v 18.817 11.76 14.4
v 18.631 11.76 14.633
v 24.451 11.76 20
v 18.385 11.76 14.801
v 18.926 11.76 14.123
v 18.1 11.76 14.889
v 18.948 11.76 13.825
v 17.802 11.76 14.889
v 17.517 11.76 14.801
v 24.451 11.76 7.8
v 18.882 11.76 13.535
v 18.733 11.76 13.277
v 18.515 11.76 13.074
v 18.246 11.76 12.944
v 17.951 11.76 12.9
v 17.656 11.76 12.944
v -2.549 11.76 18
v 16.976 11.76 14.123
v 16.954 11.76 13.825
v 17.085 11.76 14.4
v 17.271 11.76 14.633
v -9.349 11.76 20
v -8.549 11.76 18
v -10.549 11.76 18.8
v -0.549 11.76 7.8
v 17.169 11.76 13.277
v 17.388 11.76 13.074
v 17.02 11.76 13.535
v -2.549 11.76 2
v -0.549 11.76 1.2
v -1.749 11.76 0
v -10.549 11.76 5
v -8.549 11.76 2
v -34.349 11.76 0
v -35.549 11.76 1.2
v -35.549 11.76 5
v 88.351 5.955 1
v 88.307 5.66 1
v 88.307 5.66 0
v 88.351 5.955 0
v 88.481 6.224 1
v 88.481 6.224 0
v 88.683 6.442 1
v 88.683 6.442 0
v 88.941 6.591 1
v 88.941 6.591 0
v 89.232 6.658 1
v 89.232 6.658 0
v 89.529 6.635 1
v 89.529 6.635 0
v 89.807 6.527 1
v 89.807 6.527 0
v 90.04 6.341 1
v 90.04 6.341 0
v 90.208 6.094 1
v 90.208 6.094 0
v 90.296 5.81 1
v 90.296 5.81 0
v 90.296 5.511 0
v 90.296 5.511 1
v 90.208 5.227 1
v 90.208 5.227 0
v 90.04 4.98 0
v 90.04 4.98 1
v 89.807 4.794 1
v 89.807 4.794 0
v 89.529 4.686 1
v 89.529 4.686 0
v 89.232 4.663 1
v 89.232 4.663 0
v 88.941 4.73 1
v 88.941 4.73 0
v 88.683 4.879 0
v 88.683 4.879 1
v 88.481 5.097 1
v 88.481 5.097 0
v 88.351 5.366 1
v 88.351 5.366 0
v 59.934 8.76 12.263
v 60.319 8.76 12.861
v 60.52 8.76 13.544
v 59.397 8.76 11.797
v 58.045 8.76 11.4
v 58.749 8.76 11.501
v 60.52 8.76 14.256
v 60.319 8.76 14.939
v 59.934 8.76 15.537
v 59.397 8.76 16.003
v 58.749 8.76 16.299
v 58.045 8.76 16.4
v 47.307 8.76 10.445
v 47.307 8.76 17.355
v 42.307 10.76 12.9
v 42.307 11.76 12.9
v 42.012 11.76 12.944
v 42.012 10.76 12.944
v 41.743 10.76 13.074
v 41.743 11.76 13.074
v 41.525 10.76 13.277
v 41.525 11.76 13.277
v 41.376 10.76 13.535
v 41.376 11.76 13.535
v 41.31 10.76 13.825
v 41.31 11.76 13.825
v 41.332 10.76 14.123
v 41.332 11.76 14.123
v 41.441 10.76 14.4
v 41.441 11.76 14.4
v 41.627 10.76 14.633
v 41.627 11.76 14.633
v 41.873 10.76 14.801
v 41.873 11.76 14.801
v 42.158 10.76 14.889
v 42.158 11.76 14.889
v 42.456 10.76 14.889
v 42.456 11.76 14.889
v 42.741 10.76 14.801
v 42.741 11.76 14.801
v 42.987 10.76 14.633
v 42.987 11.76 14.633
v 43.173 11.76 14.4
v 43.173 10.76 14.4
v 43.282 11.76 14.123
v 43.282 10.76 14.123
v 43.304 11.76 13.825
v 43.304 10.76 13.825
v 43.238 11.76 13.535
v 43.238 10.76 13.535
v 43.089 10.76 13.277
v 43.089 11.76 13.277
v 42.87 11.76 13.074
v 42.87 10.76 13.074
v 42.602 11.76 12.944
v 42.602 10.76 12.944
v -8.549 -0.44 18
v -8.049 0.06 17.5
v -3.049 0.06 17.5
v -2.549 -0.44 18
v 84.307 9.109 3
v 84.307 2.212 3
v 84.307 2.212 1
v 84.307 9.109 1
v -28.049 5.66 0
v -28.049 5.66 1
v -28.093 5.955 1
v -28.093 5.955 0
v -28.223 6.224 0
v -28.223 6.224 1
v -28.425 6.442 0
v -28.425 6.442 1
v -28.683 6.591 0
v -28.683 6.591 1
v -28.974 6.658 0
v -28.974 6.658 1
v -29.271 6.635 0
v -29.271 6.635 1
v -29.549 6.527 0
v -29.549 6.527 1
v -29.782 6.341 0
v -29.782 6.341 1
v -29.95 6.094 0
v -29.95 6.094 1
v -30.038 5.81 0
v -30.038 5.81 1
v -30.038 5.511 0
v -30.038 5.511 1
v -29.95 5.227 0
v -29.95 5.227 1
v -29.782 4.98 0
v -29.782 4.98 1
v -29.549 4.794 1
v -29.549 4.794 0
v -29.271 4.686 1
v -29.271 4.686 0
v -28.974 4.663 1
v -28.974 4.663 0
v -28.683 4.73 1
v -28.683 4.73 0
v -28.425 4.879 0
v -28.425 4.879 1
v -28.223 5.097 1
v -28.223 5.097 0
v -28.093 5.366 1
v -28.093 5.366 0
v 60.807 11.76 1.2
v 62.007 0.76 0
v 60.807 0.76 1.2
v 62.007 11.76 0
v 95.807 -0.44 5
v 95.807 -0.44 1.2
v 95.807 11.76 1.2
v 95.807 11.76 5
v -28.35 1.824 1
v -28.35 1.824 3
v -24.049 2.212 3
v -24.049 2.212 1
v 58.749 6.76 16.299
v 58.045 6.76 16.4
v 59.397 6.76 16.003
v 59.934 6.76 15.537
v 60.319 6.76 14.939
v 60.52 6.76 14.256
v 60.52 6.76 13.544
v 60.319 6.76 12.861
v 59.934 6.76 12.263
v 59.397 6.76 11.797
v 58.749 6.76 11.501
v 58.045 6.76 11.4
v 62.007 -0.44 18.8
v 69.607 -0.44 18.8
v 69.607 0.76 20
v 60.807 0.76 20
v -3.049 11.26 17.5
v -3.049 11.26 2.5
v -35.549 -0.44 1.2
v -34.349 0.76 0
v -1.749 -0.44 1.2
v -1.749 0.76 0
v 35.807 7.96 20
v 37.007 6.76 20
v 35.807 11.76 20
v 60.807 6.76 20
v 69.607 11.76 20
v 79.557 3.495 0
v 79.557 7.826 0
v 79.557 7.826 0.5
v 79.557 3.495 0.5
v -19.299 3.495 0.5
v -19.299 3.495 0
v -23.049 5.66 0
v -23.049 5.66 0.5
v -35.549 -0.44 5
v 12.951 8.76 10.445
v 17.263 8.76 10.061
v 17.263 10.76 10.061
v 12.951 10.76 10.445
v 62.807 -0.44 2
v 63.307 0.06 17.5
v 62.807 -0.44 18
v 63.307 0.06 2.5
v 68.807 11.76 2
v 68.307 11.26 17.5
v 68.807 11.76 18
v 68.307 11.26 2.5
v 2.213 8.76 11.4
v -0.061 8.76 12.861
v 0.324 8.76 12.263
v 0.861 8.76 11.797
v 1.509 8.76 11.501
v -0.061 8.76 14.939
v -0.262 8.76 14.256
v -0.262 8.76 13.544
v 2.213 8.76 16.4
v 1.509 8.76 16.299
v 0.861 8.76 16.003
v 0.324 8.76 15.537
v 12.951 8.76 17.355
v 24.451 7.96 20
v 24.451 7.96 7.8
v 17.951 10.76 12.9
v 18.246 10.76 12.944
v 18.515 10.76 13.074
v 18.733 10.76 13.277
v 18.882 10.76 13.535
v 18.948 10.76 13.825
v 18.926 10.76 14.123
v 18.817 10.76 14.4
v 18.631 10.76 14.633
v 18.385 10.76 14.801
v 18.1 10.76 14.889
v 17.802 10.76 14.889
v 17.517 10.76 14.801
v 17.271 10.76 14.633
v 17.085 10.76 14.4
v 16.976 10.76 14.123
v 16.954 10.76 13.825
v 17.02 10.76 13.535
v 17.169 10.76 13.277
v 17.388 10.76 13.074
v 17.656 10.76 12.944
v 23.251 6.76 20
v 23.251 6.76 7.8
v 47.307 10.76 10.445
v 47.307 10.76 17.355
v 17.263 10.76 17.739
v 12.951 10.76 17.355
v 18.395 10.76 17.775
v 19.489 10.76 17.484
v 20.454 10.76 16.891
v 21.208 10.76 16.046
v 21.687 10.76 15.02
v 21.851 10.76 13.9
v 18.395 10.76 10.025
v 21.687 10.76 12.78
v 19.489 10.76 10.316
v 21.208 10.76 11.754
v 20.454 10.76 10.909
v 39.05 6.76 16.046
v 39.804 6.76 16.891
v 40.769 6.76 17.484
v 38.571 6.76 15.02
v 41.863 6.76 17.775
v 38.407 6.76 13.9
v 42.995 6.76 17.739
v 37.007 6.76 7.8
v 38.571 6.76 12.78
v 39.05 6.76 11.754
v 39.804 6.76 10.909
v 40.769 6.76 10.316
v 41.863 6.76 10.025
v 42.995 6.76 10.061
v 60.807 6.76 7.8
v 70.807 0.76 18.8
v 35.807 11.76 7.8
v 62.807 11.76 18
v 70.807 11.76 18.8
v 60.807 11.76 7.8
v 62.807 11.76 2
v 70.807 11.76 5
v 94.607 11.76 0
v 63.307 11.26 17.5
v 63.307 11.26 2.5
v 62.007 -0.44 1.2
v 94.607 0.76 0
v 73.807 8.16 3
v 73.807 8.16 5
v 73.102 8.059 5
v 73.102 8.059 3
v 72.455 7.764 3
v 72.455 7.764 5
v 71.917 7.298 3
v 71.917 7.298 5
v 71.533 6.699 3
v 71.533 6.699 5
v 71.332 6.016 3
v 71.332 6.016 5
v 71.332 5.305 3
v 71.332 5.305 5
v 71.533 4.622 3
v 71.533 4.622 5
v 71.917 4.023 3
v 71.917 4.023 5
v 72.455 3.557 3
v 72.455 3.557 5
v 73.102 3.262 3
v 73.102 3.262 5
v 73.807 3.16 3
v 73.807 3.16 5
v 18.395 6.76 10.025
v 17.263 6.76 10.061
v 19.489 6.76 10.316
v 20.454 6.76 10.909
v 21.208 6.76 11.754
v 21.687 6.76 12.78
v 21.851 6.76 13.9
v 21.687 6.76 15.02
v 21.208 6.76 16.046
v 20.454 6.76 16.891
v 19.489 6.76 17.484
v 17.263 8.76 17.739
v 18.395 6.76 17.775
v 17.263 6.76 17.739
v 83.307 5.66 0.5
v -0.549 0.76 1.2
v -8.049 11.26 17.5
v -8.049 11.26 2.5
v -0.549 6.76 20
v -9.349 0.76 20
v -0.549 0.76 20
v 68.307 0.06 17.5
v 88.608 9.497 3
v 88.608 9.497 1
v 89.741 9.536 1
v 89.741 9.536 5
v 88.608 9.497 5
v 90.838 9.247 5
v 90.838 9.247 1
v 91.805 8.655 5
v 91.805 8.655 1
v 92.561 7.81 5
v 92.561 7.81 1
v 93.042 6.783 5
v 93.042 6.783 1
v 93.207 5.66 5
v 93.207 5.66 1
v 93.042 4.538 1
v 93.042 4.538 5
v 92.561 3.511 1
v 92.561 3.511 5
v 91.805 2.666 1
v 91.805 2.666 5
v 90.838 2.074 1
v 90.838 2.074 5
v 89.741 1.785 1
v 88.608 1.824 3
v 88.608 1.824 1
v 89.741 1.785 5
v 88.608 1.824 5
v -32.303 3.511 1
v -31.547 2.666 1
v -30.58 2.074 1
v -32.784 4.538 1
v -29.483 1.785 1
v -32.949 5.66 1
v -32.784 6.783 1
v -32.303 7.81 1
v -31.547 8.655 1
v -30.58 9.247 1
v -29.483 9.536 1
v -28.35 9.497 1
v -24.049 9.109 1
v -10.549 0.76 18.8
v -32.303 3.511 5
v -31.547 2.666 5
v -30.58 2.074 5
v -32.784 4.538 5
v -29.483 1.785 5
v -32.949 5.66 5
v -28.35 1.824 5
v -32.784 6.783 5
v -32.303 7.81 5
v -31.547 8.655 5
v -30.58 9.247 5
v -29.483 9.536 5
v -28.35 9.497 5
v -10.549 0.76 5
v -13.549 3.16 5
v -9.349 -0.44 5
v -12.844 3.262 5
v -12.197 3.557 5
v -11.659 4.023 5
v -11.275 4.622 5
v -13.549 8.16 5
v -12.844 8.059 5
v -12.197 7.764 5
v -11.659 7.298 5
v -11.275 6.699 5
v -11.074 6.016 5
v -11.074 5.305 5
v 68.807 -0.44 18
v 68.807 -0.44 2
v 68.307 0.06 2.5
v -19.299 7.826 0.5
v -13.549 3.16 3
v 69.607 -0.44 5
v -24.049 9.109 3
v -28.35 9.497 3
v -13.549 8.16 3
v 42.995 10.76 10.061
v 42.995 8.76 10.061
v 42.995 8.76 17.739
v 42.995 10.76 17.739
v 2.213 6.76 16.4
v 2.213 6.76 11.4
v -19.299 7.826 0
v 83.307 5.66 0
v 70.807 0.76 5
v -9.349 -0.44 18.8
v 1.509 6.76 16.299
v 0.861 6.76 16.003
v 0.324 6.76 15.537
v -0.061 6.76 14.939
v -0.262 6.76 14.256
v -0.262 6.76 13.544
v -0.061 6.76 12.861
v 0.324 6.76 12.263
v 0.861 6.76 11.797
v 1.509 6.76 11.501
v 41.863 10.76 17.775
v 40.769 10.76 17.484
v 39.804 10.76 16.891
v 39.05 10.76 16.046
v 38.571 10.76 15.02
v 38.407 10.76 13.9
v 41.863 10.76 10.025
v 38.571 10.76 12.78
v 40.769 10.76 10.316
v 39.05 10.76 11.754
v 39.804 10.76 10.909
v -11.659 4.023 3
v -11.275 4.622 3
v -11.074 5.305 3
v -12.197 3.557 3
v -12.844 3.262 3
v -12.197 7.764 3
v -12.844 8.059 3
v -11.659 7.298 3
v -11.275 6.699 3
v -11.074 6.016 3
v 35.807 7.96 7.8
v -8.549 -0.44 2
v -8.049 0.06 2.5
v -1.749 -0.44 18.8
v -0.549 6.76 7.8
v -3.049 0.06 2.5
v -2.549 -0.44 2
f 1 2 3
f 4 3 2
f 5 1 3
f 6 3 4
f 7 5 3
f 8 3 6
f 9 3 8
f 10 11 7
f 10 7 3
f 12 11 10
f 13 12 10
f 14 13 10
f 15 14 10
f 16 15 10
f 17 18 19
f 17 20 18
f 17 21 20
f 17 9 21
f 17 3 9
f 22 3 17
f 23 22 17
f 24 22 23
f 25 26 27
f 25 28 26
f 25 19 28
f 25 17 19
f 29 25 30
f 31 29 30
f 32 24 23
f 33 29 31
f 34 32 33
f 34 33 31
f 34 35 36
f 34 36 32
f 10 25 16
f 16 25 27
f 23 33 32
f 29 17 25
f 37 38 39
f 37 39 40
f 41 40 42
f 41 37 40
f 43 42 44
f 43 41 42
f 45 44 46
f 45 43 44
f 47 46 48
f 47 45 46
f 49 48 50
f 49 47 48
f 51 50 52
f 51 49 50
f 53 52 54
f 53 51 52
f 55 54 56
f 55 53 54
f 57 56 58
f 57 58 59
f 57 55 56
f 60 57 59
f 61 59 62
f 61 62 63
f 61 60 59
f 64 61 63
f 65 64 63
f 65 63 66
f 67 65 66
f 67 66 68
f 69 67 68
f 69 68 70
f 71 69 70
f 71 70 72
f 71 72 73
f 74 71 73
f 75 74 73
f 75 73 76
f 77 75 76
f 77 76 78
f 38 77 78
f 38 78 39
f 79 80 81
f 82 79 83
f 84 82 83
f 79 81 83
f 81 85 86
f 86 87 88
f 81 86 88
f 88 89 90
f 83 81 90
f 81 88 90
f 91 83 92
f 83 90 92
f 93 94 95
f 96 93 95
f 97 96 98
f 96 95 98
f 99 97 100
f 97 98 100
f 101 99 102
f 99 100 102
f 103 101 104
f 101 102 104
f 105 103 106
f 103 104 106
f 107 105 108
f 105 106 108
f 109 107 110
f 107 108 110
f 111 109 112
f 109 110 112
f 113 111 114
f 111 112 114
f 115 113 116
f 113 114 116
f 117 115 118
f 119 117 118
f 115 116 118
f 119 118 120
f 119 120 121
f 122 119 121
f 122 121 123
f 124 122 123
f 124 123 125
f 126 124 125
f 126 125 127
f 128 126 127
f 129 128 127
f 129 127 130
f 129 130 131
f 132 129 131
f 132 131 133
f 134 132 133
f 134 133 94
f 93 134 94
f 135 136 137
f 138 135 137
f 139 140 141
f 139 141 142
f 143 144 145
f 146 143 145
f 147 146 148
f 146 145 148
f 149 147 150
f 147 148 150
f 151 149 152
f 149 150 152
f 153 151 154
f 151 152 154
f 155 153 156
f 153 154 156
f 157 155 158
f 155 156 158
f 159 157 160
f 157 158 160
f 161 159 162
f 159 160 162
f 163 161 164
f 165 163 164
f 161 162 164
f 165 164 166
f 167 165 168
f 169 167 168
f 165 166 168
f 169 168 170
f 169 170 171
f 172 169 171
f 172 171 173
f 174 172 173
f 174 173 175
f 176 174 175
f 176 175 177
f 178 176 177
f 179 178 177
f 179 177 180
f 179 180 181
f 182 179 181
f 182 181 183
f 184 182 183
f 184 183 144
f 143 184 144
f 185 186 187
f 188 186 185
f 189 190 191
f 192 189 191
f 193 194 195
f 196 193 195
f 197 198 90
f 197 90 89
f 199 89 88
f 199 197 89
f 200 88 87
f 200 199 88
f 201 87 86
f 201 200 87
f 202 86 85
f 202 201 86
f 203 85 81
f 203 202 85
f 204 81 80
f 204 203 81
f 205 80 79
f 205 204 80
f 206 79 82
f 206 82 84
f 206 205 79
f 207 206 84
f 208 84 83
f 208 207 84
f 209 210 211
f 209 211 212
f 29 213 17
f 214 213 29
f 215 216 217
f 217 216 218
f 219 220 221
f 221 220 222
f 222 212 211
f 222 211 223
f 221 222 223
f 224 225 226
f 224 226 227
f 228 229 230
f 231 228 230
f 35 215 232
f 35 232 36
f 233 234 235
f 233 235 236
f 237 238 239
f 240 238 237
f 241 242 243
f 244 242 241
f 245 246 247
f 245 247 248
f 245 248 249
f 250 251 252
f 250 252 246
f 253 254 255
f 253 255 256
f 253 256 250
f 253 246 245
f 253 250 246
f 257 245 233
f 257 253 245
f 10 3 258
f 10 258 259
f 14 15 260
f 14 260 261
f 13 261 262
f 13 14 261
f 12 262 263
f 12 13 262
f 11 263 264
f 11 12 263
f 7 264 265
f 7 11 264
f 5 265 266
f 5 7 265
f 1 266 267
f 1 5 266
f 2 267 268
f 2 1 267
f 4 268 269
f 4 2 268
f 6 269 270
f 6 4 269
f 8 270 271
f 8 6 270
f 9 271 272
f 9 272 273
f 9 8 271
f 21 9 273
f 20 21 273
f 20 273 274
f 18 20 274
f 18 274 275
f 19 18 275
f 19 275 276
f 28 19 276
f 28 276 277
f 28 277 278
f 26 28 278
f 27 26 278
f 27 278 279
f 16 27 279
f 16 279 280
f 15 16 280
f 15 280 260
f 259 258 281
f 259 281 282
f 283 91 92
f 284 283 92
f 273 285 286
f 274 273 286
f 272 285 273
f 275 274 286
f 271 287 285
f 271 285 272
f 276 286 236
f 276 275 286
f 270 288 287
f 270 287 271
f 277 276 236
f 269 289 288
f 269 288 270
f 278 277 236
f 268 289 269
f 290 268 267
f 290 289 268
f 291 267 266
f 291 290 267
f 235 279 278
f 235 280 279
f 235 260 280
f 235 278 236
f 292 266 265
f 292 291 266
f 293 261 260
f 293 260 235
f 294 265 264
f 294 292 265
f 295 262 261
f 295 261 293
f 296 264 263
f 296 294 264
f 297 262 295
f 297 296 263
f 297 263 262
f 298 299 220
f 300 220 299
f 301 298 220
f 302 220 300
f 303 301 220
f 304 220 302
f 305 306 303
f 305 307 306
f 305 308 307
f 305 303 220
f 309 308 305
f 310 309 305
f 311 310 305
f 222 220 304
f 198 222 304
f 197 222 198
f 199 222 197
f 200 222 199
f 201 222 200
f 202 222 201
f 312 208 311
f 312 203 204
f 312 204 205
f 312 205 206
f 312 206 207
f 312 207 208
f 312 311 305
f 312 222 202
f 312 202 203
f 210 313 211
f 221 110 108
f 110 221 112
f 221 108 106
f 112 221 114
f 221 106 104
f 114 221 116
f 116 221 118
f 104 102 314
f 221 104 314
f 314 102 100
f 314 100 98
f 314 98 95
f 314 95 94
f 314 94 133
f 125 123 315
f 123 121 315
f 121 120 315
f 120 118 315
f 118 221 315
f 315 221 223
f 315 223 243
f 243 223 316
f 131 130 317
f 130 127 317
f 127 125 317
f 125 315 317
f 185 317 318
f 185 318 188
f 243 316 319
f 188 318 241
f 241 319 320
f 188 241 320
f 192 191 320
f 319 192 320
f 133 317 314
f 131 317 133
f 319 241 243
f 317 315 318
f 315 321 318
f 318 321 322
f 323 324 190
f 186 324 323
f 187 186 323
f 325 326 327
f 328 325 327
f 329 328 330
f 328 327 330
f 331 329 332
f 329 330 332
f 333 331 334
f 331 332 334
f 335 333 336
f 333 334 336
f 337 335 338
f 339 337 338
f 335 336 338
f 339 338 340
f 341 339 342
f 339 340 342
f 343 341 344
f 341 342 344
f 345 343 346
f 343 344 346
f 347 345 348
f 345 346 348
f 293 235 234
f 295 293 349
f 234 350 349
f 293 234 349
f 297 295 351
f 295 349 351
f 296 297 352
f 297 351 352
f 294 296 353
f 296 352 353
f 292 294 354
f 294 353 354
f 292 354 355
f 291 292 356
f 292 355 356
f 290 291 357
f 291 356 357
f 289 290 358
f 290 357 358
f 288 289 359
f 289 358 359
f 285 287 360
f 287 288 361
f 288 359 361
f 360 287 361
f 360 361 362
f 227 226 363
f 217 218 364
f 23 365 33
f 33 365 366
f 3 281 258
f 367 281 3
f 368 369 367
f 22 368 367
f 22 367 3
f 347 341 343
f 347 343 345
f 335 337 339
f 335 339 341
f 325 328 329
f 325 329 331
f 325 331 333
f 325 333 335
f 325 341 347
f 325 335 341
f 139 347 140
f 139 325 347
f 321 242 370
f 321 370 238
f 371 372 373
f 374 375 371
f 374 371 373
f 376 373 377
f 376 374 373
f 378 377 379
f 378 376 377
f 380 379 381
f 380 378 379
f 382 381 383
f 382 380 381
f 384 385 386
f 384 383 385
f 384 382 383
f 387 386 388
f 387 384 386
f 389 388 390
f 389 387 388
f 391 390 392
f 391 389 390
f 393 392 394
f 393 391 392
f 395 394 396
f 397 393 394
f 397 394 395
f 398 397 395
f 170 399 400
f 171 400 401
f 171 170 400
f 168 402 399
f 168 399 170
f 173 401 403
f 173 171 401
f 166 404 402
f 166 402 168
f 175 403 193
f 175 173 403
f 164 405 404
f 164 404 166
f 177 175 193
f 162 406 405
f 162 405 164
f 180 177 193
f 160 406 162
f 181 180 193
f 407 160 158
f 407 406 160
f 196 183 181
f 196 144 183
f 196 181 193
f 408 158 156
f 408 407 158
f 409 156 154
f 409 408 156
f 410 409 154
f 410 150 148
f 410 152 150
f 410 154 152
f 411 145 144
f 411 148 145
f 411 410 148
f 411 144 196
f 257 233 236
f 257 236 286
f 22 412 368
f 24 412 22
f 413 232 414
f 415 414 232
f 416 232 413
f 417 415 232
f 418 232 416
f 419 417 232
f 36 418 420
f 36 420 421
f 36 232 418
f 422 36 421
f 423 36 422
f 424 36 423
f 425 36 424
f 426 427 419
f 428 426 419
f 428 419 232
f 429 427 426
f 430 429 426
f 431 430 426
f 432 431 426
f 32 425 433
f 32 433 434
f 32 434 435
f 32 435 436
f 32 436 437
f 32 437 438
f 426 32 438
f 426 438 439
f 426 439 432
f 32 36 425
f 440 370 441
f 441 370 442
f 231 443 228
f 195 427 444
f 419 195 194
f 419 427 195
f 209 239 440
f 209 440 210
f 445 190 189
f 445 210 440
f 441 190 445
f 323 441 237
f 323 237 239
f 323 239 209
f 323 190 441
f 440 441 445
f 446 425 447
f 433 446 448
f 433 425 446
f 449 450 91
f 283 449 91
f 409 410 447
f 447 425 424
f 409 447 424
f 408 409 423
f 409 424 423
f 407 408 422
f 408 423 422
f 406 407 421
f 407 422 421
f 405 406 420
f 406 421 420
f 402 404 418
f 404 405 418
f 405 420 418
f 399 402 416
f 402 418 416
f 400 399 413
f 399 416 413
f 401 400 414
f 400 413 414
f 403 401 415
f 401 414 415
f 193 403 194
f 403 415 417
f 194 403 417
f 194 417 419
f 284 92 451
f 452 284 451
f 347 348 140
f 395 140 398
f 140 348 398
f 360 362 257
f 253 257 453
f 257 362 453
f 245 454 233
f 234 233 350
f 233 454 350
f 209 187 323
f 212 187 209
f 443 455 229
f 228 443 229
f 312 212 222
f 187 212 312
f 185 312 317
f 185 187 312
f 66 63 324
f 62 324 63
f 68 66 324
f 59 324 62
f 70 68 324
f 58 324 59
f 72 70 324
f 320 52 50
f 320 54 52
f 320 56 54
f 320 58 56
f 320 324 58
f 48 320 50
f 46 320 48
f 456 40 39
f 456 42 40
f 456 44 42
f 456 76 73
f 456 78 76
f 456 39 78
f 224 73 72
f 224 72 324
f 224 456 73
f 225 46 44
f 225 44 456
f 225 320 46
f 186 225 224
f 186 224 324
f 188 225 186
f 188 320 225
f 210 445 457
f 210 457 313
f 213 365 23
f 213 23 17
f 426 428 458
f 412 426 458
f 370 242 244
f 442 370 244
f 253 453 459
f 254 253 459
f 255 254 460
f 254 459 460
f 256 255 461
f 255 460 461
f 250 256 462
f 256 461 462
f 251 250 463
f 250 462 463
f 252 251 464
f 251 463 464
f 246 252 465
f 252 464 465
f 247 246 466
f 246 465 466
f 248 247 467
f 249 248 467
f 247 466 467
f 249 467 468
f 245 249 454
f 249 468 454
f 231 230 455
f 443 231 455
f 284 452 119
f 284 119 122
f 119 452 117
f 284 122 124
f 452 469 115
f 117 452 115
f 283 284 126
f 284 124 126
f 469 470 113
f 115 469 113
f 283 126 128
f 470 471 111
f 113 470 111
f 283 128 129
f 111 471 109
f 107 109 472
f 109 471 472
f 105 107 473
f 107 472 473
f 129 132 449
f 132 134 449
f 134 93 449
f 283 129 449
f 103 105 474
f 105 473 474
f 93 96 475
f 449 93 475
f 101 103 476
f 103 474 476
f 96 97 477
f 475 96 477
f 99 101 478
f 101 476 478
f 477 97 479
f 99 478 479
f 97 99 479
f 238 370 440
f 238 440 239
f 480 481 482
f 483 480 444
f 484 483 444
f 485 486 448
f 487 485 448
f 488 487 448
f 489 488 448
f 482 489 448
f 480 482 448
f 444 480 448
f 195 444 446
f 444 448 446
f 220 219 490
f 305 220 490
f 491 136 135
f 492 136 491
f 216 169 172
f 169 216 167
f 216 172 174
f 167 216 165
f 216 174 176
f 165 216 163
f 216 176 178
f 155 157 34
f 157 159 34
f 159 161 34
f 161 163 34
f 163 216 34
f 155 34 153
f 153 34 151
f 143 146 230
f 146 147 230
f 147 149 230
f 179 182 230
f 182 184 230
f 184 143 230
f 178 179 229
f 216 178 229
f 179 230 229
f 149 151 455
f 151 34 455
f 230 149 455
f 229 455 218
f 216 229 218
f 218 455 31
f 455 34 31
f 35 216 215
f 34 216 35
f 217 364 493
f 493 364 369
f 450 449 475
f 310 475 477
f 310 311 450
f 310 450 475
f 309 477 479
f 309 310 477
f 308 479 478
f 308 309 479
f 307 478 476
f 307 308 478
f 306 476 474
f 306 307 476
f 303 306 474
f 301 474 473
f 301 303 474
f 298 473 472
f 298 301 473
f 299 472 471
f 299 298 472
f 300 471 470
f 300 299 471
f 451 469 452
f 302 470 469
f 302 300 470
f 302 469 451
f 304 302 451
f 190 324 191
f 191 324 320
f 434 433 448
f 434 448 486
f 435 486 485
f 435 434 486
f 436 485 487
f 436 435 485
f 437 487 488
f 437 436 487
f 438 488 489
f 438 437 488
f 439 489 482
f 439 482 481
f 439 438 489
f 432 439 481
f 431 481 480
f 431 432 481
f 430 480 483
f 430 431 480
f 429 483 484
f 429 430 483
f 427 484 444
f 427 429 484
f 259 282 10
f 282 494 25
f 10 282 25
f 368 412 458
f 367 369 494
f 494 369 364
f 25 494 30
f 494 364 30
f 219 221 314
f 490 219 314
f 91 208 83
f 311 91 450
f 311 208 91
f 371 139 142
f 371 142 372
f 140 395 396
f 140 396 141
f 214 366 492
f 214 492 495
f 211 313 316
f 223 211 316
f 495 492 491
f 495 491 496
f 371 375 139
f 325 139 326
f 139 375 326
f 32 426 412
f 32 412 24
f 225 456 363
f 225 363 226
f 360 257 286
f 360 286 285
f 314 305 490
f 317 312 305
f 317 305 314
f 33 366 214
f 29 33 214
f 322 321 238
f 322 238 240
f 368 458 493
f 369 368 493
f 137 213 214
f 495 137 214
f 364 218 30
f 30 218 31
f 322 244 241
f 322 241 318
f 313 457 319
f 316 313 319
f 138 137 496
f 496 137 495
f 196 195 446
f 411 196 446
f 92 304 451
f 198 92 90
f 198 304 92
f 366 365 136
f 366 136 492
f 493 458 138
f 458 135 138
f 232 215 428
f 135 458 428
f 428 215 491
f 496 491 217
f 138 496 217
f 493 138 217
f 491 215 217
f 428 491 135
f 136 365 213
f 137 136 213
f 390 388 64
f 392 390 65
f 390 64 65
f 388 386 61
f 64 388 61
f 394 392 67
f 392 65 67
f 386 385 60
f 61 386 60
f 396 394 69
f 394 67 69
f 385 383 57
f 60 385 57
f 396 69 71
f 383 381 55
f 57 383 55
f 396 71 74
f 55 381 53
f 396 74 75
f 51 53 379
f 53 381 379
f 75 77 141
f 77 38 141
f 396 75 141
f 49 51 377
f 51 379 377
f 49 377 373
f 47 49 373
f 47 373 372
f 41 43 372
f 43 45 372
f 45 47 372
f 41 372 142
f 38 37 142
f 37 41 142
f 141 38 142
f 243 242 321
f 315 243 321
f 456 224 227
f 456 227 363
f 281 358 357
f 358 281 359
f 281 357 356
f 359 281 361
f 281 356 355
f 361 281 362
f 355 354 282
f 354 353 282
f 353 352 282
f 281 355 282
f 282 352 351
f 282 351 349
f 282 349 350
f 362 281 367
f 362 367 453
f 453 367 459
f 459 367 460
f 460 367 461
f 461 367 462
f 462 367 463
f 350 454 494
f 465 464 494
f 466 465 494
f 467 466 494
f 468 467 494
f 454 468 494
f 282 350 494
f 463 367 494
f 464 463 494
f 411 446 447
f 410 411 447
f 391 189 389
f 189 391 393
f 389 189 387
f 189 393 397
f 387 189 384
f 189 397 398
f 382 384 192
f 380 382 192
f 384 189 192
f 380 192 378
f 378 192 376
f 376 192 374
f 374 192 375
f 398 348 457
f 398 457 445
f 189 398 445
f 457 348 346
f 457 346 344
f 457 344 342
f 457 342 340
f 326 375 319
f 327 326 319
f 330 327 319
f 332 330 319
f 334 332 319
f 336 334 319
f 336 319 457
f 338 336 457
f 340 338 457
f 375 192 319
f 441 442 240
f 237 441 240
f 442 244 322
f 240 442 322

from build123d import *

# Parameters (mm, degrees)
SKETCH1_W               = 35
SKETCH1_H               = 12.2
BOSS_EXTRUDE1_DEPTH     = 5
SKETCH2_R               = 1
CUT_EXTRUDE1_DEPTH      = 38.775970389
SKETCH3_W               = 10
SKETCH3_H               = 12.2
BOSS_EXTRUDE2_DEPTH     = 15
SKETCH4_W               = 12.2
SKETCH4_H               = 5
BOSS_EXTRUDE3_DEPTH     = 25
CUT_EXTRUDE2_DEPTH      = 42.419255471
CUT_EXTRUDE2_DEPTH_BACK = 42.419255471
SKETCH5_R               = 1
CUT_EXTRUDE3_DEPTH      = 0.5
CHAMFER1_SIZE           = 1.2
SKETCH8_R               = 3.9
CUT_EXTRUDE4_DEPTH      = 4
CUT_EXTRUDE5_DEPTH      = 2
CUT_EXTRUDE6_DEPTH      = 4
SKETCH20_R              = 3.9
CUT_EXTRUDE11_DEPTH     = 4
CUT_EXTRUDE12_DEPTH     = 2
CUT_EXTRUDE13_DEPTH     = 4
SKETCH23_W              = 5
SKETCH23_H              = 15
CUT_EXTRUDE14_DEPTH     = 43.574108608
CHAMFER2_SIZE           = 0.5


with BuildPart() as part:
    # Sketch1 → Boss-Extrude1 (new body)
    with BuildSketch(Plane.XY):
        with Locations((-18.048765432, 5.660493827)):
            Rectangle(SKETCH1_W, SKETCH1_H)
    extrude(amount=BOSS_EXTRUDE1_DEPTH)

    # Sketch2 → Cut-Extrude1 (cut, through all)
    with BuildSketch(Plane.XY.offset(5)):
        with Locations((-29.048765432, 5.660493827)):
            Circle(SKETCH2_R)
    extrude(amount=-CUT_EXTRUDE1_DEPTH, mode=Mode.SUBTRACT)

    # Sketch3 → Boss-Extrude2 (add)
    with BuildSketch(Plane.XY.offset(5)):
        with Locations((-5.548765432, 5.660493827)):
            Rectangle(SKETCH3_W, SKETCH3_H)
    extrude(amount=BOSS_EXTRUDE2_DEPTH)

    # Sketch4 → Boss-Extrude3 (add)
    with BuildSketch(Plane(origin=(-0.548765432, 0, 0), x_dir=(0, 0, -1), z_dir=(1, 0, 0))):
        with Locations((-13.9, 9.260493827)):
            Rectangle(SKETCH4_W, SKETCH4_H)
    extrude(amount=BOSS_EXTRUDE3_DEPTH)

    # Sketch5 → Cut-Extrude2 (cut, two sides: drawn at the far end of the back side and taken through both)
    with BuildSketch(Plane.XZ.offset(-6.760493827).offset(-CUT_EXTRUDE2_DEPTH_BACK)):
        with Locations(Location((17.951234568, 13.9, 0), (0, 0, 270))):
            Circle(SKETCH5_R)
    extrude(amount=CUT_EXTRUDE2_DEPTH + CUT_EXTRUDE2_DEPTH_BACK, mode=Mode.SUBTRACT)

    # Sketch7 → Cut-Extrude3 (cut)
    with BuildSketch(Plane(origin=(0, 0, 0), x_dir=(-1, 0, 0), z_dir=(0, 0, -1))):
        Polygon((23.048765432, 5.660493827), (19.298765432, 7.825557337), (19.298765432, 3.495430318), align=None)
    extrude(amount=-CUT_EXTRUDE3_DEPTH, mode=Mode.SUBTRACT)

    # Chamfer1
    chamfer1_edges = [part.edges().sort_by_distance(p)[0] for p in [
        (-10.548765432, -0.439506173, 12.5),
        (-10.548765432, 5.660493827, 20),
        (-5.548765432, -0.439506173, 20),
        (24.451234568, 6.760493827, 13.9),
        (-0.548765432, 5.660493827, 0),
        (-18.048765432, -0.439506173, 0),
        (-35.548765432, 5.660493827, 0),
        (-0.548765432, -0.439506173, 10),
    ]]
    chamfer(chamfer1_edges, length=CHAMFER1_SIZE)

    # Sketch8 → Cut-Extrude4 (cut)
    with BuildSketch(Plane.XY.offset(5)):
        with Locations((-29.048765432, 5.660493827)):
            Circle(SKETCH8_R)
    extrude(amount=-CUT_EXTRUDE4_DEPTH, mode=Mode.SUBTRACT)

    # Sketch10 → Cut-Extrude5 (cut)
    with BuildSketch(Plane.XY.offset(5)):
        with BuildLine():
            Line((-29.048765432, 9.560493827), (-13.548765432, 8.160493827))
            ThreePointArc((-13.548765432, 8.160493827), (-11.048765432, 5.660493827), (-13.548765432, 3.160493827))
            Line((-13.548765432, 3.160493827), (-29.048765432, 1.760493827))
            Line((-29.048765432, 1.760493827), (-29.048765432, 9.560493827))
        make_face()
    extrude(amount=-CUT_EXTRUDE5_DEPTH, mode=Mode.SUBTRACT)

    # Sketch12 → Cut-Extrude6 (cut)
    with BuildSketch(Plane.XY.offset(5)):
        Polygon((-24.048765432, 5.660493827), (-24.048765432, 9.108880924), (-29.048765432, 9.560493827), (-29.048765432, 1.760493827), (-24.048765432, 2.21210673), align=None)
    extrude(amount=-CUT_EXTRUDE6_DEPTH, mode=Mode.SUBTRACT)

    # Sketch20 → Cut-Extrude11 (cut)
    with BuildSketch(Plane.XZ.offset(-6.760493827)):
        with Locations(Location((17.951234568, 13.9, 0), (0, 0, 270))):
            Circle(SKETCH20_R)
    extrude(amount=-CUT_EXTRUDE11_DEPTH, mode=Mode.SUBTRACT)

    # Sketch21 → Cut-Extrude12 (cut)
    with BuildSketch(Plane.XZ.offset(-6.760493827)):
        with BuildLine():
            Line((17.951234568, 17.8), (2.21295028, 16.4))
            ThreePointArc((2.21295028, 16.4), (-0.28704972, 13.9), (2.21295028, 11.4))
            Line((2.21295028, 11.4), (17.951234568, 10))
            Line((17.951234568, 10), (17.951234568, 17.8))
        make_face()
    extrude(amount=-CUT_EXTRUDE12_DEPTH, mode=Mode.SUBTRACT)

    # Sketch22 → Cut-Extrude13 (cut)
    with BuildSketch(Plane.XZ.offset(-6.760493827)):
        Polygon((17.951234568, 17.8), (17.951234568, 10), (12.951234568, 10.444775293), (12.951234568, 17.355224707), align=None)
    extrude(amount=-CUT_EXTRUDE13_DEPTH, mode=Mode.SUBTRACT)

    # Sketch23 → Cut-Extrude14 (cut, through all)
    with BuildSketch(Plane(origin=(0, 11.760493827, 0), x_dir=(1, 0, 0), z_dir=(0, 1, 0))):
        with Locations((-5.548765432, -10)):
            Rectangle(SKETCH23_W, SKETCH23_H)
    extrude(amount=-CUT_EXTRUDE14_DEPTH, mode=Mode.SUBTRACT)

    # Chamfer2
    chamfer2_edges = [part.edges().sort_by_distance(p)[0] for p in [
        (-8.048765432, -0.439506173, 10),
        (-5.548765432, -0.439506173, 2.5),
        (-3.048765432, -0.439506173, 10),
        (-5.548765432, -0.439506173, 17.5),
        (-8.048765432, 11.760493827, 10),
        (-5.548765432, 11.760493827, 17.5),
        (-3.048765432, 11.760493827, 10),
        (-5.548765432, 11.760493827, 2.5),
    ]]
    chamfer(chamfer2_edges, length=CHAMFER2_SIZE)


with BuildPart() as body_2:
    # Mirror3: mirrored copy
    add(part.part.mirror(Plane(origin=(30.129011824, 0, 0), x_dir=(0, 0, 1), z_dir=(1, 0, 0))))


solid = Compound([part.part, body_2.part])
